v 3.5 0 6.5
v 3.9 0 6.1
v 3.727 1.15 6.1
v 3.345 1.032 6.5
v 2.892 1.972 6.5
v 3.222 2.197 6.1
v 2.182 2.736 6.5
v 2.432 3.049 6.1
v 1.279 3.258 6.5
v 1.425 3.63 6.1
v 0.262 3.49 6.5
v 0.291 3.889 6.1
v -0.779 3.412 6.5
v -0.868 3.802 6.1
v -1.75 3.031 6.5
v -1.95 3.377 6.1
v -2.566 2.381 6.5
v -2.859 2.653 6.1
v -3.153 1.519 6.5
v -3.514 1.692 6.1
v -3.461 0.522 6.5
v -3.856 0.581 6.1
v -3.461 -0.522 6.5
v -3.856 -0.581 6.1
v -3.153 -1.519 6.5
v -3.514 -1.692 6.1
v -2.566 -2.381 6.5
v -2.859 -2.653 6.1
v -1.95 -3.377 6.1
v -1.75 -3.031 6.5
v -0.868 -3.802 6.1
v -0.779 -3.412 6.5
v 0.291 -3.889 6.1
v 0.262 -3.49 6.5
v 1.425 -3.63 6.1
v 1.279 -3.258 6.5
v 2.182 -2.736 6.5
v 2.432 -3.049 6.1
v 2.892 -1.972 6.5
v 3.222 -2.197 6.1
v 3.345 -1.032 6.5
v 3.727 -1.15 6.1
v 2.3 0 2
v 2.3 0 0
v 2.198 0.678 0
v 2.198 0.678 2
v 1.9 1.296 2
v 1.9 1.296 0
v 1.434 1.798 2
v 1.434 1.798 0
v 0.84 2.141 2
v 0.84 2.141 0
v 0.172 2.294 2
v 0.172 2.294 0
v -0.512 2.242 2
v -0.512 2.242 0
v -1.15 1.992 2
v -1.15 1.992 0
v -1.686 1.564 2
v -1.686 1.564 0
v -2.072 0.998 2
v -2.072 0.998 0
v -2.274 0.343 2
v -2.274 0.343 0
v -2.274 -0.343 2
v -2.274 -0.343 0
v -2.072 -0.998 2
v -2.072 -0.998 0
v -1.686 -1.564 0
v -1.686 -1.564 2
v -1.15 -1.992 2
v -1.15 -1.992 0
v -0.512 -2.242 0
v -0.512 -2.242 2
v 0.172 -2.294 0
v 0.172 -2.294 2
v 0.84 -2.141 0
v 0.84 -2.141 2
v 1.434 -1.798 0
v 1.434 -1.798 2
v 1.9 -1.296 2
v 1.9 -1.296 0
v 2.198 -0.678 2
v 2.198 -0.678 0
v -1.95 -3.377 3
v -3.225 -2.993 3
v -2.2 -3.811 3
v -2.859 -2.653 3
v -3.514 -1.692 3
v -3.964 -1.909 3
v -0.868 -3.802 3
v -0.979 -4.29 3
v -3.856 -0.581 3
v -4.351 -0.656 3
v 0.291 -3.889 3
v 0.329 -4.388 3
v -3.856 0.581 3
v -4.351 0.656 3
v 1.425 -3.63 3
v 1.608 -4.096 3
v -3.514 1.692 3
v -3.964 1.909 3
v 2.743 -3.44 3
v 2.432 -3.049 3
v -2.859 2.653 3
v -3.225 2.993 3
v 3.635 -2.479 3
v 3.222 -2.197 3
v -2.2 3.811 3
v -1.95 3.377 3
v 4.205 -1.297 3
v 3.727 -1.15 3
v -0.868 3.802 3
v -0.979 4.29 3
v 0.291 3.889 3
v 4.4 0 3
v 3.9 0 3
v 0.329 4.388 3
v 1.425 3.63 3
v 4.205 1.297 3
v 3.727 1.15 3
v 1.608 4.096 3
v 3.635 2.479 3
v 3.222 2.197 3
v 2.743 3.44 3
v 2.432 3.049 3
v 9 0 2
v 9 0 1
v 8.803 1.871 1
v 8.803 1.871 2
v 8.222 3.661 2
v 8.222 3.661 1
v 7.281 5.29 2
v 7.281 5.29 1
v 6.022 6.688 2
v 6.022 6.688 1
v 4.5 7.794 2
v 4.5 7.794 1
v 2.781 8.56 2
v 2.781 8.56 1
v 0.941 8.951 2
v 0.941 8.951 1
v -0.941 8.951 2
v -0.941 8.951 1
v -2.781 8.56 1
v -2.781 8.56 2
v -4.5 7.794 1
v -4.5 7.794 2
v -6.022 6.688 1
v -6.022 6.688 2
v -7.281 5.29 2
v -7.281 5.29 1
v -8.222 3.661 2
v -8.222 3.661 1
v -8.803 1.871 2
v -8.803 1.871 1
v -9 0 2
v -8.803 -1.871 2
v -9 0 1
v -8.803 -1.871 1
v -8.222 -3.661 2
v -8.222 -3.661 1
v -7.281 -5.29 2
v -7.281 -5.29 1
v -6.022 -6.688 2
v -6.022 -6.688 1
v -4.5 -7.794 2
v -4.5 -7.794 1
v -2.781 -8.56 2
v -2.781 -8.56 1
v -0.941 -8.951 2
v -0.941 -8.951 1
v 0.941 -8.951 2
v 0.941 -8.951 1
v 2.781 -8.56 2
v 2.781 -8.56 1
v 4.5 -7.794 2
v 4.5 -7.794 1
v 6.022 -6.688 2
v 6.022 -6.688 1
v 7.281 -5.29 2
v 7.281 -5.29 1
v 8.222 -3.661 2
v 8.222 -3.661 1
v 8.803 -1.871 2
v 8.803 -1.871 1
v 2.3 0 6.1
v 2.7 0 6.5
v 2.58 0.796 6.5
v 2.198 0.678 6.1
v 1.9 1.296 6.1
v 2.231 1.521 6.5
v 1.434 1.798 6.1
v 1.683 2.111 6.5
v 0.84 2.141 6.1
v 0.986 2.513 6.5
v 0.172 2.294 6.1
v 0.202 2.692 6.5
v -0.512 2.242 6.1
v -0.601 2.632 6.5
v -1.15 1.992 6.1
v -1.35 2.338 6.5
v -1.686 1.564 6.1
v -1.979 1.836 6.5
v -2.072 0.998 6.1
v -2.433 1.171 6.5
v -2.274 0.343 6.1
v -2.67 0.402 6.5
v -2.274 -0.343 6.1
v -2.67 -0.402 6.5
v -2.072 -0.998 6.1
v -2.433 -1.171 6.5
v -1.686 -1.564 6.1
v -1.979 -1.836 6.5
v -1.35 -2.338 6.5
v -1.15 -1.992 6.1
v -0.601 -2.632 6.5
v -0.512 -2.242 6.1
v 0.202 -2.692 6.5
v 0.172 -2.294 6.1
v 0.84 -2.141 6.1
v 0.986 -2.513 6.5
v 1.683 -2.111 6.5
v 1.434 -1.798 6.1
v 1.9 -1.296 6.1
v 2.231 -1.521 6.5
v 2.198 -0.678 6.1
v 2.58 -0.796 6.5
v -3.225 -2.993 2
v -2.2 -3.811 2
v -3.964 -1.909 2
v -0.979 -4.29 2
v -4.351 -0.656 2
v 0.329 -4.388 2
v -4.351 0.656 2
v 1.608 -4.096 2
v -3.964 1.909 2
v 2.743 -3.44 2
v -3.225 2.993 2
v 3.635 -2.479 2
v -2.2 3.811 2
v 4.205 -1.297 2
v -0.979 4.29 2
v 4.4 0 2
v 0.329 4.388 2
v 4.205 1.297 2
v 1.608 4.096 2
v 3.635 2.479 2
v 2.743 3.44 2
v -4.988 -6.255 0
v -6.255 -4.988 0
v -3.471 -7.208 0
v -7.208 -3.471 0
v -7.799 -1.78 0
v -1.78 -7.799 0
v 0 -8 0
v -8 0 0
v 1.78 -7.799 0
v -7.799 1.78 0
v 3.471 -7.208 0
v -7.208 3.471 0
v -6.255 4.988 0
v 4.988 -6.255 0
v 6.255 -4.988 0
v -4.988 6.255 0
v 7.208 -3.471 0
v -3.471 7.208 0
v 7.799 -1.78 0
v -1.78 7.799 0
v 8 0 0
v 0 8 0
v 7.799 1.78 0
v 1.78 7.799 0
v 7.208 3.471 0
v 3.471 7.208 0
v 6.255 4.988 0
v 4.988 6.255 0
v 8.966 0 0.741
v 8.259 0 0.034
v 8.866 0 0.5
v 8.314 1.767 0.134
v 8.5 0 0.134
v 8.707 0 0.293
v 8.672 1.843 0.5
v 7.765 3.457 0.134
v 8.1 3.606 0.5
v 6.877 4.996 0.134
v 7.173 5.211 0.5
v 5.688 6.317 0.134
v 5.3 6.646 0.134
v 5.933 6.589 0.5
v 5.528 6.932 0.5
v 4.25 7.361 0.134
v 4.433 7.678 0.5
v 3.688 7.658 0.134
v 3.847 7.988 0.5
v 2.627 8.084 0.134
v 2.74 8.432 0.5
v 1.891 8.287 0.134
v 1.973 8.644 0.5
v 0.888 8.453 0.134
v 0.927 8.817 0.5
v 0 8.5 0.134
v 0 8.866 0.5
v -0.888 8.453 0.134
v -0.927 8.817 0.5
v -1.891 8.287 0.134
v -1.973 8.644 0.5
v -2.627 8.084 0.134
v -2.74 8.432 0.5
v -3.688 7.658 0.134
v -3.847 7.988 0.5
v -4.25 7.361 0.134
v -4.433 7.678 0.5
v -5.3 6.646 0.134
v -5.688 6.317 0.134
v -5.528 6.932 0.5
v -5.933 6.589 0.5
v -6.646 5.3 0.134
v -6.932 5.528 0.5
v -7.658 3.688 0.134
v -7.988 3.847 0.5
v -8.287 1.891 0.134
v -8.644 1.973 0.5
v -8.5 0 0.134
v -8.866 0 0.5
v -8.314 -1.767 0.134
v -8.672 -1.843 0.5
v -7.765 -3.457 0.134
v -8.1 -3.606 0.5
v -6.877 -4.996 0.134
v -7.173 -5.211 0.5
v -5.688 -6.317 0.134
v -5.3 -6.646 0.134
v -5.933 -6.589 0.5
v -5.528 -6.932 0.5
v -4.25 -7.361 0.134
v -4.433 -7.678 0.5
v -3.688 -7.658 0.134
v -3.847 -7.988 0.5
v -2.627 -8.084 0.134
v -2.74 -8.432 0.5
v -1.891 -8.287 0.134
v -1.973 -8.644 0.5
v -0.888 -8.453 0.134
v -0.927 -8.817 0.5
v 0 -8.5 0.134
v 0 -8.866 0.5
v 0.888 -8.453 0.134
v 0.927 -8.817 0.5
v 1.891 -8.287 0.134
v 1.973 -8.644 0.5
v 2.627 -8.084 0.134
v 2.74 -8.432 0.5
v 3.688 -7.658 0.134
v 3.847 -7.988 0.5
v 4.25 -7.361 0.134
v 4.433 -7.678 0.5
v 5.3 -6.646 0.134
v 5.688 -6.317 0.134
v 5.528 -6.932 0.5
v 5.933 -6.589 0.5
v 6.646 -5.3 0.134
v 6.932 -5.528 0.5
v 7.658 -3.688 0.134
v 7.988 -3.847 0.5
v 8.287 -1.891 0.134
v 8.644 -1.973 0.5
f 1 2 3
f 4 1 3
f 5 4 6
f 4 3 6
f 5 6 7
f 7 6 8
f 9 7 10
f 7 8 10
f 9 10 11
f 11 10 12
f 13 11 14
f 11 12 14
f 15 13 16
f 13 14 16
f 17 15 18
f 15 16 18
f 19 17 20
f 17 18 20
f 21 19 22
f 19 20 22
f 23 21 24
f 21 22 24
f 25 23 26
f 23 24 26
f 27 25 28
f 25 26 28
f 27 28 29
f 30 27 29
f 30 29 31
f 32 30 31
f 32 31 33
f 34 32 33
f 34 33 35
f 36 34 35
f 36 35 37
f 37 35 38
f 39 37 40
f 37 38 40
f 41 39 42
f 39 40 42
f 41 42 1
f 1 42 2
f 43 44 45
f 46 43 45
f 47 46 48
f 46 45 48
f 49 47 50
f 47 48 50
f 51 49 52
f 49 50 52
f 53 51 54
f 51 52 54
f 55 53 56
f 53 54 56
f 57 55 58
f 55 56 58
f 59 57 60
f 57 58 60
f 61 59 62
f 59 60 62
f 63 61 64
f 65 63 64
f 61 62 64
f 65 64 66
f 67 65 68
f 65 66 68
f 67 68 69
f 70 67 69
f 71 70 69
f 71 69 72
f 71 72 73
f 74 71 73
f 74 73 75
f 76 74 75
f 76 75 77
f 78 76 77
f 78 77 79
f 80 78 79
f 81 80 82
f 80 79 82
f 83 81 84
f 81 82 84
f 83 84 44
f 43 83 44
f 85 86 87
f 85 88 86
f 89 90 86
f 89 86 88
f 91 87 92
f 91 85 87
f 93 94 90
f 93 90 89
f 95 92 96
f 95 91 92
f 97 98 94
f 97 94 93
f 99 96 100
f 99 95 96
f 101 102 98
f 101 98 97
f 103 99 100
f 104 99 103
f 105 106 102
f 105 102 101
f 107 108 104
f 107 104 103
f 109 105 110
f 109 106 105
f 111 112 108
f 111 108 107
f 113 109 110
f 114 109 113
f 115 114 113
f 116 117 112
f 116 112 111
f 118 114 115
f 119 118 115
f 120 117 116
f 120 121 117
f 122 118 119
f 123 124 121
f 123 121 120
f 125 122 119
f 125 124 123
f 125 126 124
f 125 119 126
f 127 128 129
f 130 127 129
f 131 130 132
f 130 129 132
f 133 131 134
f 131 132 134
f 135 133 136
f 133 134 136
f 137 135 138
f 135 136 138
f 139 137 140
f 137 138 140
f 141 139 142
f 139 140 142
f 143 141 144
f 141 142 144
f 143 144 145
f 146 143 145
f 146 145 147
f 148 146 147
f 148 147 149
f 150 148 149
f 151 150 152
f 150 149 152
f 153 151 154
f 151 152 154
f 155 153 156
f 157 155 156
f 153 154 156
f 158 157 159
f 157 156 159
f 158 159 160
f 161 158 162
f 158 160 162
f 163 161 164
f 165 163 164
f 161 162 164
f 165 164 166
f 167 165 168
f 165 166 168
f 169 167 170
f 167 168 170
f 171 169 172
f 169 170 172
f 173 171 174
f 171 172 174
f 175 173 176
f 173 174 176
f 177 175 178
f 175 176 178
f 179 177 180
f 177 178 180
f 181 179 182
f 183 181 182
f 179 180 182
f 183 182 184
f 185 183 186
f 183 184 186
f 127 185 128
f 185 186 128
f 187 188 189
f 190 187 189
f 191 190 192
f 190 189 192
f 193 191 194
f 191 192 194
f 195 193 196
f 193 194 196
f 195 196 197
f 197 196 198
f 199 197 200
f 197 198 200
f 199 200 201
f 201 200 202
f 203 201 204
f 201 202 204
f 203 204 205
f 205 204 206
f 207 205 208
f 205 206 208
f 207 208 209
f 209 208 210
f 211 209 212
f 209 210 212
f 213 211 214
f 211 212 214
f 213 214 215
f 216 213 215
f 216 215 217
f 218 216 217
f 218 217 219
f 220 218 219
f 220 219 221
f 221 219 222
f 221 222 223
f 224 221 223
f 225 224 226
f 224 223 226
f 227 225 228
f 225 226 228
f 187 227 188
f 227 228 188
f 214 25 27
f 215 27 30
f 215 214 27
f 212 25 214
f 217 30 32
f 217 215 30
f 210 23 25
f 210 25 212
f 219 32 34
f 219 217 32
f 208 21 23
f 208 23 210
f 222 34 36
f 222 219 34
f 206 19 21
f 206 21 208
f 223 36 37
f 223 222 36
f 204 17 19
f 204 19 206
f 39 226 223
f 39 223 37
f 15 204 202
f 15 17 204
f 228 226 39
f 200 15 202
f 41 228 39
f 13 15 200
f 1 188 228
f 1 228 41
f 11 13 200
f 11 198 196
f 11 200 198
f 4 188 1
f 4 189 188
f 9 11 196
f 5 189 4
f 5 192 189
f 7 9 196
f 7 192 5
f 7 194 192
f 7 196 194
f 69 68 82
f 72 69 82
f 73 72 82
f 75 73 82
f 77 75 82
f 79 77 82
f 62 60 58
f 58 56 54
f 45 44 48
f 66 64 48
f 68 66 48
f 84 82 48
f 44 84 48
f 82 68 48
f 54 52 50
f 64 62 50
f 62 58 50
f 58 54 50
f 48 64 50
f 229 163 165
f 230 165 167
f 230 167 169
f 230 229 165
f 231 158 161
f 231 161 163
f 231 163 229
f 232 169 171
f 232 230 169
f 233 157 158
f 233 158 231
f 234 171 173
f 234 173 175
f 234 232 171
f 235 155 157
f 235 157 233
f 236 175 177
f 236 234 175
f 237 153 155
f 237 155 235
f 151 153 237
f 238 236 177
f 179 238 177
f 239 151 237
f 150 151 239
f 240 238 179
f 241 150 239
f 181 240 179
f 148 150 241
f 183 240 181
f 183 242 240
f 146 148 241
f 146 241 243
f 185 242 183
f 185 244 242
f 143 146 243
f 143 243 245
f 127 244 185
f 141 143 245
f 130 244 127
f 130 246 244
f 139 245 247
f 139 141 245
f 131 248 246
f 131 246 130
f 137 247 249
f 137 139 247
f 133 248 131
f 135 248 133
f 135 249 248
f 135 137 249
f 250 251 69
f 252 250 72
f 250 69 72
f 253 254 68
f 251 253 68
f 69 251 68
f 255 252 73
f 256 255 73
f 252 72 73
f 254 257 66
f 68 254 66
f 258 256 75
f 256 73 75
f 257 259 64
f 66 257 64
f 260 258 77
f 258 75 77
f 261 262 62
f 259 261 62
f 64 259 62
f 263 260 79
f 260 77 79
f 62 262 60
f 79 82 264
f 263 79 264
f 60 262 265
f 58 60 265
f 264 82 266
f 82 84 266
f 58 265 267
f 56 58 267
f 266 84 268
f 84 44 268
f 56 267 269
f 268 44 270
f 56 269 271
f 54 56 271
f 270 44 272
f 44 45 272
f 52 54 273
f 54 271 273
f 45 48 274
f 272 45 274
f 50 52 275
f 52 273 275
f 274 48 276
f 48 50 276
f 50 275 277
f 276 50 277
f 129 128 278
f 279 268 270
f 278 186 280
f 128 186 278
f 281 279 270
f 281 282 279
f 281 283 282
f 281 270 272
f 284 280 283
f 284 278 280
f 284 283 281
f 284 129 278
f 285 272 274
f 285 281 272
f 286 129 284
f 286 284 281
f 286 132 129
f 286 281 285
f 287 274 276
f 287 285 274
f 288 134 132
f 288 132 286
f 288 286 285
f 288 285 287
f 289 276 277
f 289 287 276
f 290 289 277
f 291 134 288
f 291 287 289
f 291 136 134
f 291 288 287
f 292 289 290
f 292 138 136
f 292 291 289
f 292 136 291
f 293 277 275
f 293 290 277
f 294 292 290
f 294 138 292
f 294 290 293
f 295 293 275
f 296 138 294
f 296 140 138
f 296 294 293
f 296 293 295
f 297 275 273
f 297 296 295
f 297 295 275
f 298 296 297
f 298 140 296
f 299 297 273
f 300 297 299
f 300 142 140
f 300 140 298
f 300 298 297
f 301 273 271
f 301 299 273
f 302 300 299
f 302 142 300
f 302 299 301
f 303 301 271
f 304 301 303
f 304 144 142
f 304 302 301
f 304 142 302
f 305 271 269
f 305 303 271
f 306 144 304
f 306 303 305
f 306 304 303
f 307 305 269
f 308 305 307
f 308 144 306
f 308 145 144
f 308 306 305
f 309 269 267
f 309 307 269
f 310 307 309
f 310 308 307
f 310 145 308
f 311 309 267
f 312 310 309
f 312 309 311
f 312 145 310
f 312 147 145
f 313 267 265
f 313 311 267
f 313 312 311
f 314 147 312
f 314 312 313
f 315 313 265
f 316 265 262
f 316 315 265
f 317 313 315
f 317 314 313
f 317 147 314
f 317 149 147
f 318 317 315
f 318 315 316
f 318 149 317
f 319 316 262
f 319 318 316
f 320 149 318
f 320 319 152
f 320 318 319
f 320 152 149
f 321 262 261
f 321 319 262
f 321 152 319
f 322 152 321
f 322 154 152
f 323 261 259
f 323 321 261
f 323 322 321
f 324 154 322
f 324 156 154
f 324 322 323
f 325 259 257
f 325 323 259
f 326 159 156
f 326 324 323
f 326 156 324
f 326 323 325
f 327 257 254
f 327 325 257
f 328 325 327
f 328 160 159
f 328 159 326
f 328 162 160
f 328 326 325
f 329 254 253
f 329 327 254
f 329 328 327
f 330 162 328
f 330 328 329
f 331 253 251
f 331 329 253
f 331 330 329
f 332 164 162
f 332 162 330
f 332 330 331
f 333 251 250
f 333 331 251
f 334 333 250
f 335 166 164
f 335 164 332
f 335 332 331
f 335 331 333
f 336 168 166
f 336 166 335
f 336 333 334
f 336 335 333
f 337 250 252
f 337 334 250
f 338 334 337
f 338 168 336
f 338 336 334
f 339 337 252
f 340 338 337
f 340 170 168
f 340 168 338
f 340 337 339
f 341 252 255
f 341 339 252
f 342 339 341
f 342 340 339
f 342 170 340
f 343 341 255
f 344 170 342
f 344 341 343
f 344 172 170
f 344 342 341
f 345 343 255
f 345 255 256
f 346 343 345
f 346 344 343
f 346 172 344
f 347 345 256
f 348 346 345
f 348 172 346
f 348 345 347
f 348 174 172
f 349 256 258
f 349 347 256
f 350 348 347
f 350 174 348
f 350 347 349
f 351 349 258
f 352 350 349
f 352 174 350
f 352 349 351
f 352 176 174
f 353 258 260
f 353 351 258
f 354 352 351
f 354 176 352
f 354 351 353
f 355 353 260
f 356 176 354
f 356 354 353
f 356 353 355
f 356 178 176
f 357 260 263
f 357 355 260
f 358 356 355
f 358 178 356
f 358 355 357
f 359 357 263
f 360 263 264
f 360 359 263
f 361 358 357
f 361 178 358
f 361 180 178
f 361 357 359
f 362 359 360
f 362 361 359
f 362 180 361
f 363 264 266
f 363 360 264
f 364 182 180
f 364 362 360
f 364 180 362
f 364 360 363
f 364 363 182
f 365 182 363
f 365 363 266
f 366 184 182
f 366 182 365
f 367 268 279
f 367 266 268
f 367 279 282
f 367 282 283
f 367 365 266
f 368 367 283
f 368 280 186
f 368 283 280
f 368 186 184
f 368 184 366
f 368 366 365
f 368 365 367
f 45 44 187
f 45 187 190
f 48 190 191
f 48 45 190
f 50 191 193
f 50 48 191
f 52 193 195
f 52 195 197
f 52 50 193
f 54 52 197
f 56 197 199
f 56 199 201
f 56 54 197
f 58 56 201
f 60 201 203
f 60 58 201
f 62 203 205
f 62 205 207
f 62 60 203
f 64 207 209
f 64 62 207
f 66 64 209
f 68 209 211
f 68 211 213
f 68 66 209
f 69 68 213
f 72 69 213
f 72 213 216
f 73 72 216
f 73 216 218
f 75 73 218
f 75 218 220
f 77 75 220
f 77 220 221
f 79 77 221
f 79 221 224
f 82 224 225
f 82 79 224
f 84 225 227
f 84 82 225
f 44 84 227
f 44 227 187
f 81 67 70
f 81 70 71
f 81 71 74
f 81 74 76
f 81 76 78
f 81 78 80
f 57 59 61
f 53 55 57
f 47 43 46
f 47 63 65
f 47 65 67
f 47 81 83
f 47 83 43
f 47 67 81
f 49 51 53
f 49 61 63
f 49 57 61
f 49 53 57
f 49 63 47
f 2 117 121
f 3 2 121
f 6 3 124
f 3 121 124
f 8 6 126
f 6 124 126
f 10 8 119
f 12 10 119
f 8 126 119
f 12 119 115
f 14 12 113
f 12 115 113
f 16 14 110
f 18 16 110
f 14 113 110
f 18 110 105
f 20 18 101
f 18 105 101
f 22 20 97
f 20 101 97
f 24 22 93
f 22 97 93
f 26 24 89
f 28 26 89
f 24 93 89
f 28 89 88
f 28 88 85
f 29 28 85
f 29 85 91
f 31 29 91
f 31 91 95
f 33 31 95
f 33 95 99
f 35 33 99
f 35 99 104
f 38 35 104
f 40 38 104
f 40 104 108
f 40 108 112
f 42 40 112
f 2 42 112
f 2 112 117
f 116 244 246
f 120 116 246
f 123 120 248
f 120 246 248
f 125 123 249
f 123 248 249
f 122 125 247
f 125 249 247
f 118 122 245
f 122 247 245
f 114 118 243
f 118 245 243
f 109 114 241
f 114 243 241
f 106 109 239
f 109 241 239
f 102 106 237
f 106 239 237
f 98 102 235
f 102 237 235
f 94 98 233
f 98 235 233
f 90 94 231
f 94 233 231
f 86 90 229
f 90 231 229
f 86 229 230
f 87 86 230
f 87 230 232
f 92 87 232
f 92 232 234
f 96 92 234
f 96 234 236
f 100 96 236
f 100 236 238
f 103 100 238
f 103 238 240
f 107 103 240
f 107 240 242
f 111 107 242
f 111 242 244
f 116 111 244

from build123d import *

# Parameters (mm, degrees)
F0_R     = 9
F0_R_2   = 4.4
F1_DEPTH = 2
F0_R_3   = 2.3
F0_R_4   = 3.9
F2_DEPTH = 3
F3_DEPTH = 6.5
F4_R     = 1
F5_SIZE  = 0.4


with BuildPart() as f1:
    # F0 (on Top) → F1 (new body)
    with BuildSketch(Plane.XY):
        Circle(F0_R)
        Circle(F0_R_2, mode=Mode.SUBTRACT)
    extrude(amount=F1_DEPTH)

    # F0 (on Top) → F2 (join)
    with BuildSketch(Plane.XY):
        Circle(F0_R_2)
        Circle(F0_R_4, mode=Mode.SUBTRACT)
    extrude(amount=F2_DEPTH)

    # F0 (on Top) → F3 (join)
    with BuildSketch(Plane.XY):
        Circle(F0_R_4)
        Circle(F0_R_3, mode=Mode.SUBTRACT)
    extrude(amount=F3_DEPTH)

    # F4
    f4_edges = [f1.edges().sort_by_distance(p)[0] for p in [
        (-9, 0, 0),
    ]]
    fillet(f4_edges, radius=F4_R)

    # F5
    f5_edges = [f1.edges().sort_by_distance(p)[0] for p in [
        (-3.9, 0, 6.5),
        (-2.3, 0, 6.5),
    ]]
    chamfer(f5_edges, length=F5_SIZE)


with BuildPart() as f1b:
    # F0 (on Top) → F1, piece 2 (new body)
    with BuildSketch(Plane.XY):
        Circle(F0_R_3)
    extrude(amount=F1_DEPTH)


solid = Compound([f1.part, f1b.part])
